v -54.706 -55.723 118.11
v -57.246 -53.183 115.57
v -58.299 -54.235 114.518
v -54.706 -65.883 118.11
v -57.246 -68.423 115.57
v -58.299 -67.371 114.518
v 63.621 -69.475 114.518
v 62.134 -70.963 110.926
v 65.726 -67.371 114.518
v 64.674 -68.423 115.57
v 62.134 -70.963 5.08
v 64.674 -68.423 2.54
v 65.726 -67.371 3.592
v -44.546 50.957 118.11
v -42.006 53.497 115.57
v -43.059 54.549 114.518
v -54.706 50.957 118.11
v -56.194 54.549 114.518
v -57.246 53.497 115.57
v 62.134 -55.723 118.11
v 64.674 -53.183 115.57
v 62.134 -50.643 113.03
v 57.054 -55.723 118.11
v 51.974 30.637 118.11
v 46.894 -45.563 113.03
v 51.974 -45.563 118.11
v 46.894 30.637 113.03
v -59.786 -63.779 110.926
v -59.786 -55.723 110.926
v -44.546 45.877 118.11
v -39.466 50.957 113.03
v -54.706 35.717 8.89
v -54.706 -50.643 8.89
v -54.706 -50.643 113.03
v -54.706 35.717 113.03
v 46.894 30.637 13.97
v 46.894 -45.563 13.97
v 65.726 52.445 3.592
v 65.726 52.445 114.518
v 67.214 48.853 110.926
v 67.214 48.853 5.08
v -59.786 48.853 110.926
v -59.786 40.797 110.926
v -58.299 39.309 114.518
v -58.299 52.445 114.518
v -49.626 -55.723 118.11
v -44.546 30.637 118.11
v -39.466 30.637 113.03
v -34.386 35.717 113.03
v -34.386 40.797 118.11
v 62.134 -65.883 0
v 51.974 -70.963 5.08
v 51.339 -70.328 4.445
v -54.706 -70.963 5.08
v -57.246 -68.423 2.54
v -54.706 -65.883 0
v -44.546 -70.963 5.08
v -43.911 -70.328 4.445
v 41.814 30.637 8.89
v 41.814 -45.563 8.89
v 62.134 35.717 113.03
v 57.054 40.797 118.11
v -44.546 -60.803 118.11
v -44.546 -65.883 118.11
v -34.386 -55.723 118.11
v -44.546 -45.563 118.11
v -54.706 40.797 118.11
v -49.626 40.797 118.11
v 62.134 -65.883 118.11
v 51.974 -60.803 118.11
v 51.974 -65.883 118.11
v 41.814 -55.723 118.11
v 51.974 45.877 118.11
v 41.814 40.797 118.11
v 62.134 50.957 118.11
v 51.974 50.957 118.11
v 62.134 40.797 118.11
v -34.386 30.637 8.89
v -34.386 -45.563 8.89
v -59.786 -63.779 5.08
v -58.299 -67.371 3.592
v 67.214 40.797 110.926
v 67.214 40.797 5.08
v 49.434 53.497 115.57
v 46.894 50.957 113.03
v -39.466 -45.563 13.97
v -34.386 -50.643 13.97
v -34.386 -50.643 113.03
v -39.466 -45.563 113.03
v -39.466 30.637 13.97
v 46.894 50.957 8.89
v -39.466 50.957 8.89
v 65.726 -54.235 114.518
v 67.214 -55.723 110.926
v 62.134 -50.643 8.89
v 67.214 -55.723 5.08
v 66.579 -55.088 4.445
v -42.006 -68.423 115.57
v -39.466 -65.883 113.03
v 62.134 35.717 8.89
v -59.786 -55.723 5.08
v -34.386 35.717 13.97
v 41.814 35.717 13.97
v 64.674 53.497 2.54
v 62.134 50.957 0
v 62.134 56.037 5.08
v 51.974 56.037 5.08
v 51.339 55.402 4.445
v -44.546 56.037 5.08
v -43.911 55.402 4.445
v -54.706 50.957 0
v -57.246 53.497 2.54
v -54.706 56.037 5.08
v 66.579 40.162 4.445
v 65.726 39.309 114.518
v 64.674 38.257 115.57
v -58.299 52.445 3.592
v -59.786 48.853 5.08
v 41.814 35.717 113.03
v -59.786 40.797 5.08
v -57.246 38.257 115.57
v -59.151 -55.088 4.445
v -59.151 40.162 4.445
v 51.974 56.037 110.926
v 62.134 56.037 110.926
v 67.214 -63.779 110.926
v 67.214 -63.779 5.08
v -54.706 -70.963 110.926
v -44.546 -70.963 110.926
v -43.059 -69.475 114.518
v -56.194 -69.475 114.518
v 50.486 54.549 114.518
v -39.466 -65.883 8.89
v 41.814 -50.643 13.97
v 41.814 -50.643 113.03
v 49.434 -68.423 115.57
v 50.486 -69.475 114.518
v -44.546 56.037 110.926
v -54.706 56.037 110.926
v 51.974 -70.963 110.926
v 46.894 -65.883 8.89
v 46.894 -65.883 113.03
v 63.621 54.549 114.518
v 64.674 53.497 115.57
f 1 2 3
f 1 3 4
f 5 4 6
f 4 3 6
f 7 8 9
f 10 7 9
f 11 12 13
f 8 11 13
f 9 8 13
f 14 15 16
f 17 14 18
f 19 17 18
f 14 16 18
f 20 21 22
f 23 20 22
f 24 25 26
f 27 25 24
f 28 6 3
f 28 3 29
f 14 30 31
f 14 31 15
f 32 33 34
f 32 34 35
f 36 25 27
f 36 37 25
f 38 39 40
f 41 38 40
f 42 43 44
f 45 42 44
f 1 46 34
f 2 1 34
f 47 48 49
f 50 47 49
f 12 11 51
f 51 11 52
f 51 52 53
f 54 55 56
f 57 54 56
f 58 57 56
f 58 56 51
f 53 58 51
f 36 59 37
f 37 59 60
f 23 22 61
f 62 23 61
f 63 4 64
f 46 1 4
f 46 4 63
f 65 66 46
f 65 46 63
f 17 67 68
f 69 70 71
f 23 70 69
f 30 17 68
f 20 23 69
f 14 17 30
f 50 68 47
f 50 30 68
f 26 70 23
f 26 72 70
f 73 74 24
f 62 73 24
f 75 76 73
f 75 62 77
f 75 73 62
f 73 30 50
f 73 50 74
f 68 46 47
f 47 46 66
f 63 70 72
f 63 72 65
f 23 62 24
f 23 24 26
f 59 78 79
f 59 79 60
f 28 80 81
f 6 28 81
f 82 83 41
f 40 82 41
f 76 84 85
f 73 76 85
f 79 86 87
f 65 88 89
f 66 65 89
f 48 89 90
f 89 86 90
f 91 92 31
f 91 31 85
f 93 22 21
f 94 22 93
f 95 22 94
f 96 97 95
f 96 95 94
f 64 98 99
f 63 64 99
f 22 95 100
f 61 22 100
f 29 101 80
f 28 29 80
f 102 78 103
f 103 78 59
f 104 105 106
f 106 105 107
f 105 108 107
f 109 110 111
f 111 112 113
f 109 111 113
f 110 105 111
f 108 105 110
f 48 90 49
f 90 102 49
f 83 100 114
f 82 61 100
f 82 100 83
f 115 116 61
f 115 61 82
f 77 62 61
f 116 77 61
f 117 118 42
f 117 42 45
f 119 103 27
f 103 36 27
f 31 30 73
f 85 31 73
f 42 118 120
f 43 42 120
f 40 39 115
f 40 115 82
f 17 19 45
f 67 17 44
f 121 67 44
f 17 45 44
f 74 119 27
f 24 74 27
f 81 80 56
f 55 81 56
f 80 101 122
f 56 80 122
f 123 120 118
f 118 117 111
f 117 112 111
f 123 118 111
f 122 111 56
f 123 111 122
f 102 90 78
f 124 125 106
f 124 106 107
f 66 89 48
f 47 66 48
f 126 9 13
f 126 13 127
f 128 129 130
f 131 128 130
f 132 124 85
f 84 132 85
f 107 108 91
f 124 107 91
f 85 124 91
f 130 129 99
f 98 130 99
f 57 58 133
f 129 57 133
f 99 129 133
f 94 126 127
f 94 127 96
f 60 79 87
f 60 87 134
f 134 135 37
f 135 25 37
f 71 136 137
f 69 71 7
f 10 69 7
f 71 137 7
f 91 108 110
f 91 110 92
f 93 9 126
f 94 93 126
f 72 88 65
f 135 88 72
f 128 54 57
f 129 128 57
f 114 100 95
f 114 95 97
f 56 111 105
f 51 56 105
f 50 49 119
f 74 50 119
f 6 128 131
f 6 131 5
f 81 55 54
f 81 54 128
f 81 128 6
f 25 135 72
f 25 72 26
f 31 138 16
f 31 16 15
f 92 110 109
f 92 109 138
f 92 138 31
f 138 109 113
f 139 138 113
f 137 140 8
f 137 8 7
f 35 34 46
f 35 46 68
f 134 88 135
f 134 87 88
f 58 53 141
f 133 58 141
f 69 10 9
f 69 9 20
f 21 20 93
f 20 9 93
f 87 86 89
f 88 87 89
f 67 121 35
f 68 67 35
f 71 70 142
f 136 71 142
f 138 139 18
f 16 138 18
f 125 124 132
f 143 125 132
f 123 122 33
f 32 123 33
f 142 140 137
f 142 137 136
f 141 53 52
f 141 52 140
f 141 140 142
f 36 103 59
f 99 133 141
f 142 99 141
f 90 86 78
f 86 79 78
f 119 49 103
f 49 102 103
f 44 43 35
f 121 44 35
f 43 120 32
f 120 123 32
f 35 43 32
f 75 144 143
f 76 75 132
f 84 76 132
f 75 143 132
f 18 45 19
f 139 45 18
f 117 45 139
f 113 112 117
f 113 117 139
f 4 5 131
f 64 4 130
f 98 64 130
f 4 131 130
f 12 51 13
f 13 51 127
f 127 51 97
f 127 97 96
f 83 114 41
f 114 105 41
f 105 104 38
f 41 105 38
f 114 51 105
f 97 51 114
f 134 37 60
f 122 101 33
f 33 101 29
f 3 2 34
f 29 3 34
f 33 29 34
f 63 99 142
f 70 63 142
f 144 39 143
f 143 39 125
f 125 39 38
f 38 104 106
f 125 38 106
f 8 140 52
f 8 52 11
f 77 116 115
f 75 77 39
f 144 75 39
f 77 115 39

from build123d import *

# Parameters (mm, degrees)
F0_W          = 127
F0_H          = 127
F1_DEPTH      = 8.89
F2_W          = 86.36
F2_H          = 10.16
F2_W_2        = 10.16
F2_H_2        = 86.36
F3_DEPTH      = 101.6
F4_W          = 10.0171214116
F4_H          = 10.0171214116
F4_W_2        = 96.3771214116
F4_H_2        = 96.3771214116
F4_W_3        = 86.36
F4_H_3        = 86.36
F5_DEPTH      = 7.62
F6_W          = 86.36
F6_H          = 5.08
F9_W          = 5.08
F9_H          = 86.36
F7_W          = 5.08
F7_H          = 86.36
F8_W          = 86.36
F8_H          = 5.08
F10_DEPTH     = 109.22
F11_SIZE      = 5.08
F12_T1_DEPTH  = 139.1582991577
F12_T3_DEPTH  = 31.7862799398
F12_T5_DEPTH  = 153.1282991577
F12_T7_DEPTH  = 117.2041495789
F12_T9_DEPTH  = 86.36
F12_T11_DEPTH = 31.7862799398
F12_T17_DEPTH = 130.2682991577
F12_T22_DEPTH = 99.4241495789
F12_T29_DEPTH = 99.4241495789
F12_T33_DEPTH = 130.2682991577
F12_T41_DEPTH = 130.2682991577
F12_T46_DEPTH = 99.4241495789
F12_T53_DEPTH = 99.4241495789
F12_T57_DEPTH = 130.2682991577
F13_T1_DEPTH  = 124.4962799399
F13_T3_DEPTH  = 142.9682991577
F13_T5_DEPTH  = 26.7062799397
F13_T7_DEPTH  = 117.2041495789
F13_T9_DEPTH  = 86.36
F13_T11_DEPTH = 26.7062799398
F13_T17_DEPTH = 130.2682991577
F13_T22_DEPTH = 99.4241495789
F13_T29_DEPTH = 99.4241495789
F13_T33_DEPTH = 130.2682991577
F13_T41_DEPTH = 130.2682991577
F13_T46_DEPTH = 99.4241495789
F13_T53_DEPTH = 99.4241495789
F13_T57_DEPTH = 130.2682991577


# Not quite as in the source:
# - a fillet or chamfer that OpenCascade refuses, or shapes differently, is made with other operations: its cross-section is extruded or revolved along the edge and cut away or added


with BuildPart() as f1:
    # F0 (on Top) → F1 (new body)
    with BuildSketch(Plane.XY):
        with Locations((3.7135761231, -7.4630701935)):
            Rectangle(F0_W, F0_H)
    extrude(amount=F1_DEPTH)

    # F2 (on face) → F3 (join)
    with BuildSketch(Plane.XY.offset(8.89)):
        Polygon((-59.7864238769, 56.0369298065), (-59.7864238769, 35.7169298065), (-49.6264238769, 35.7169298065), (-39.4664238769, 35.7169298065), (-39.4664238769, 45.8769298065), (-39.4664238769, 56.0369298065), align=None)
        with Locations((3.7135761231, 40.7969298065)):
            Rectangle(F2_W, F2_H)
        Polygon((46.8935761231, 45.8769298065), (46.8935761231, 35.7169298065), (57.0535761231, 35.7169298065), (67.2135761231, 35.7169298065), (67.2135761231, 56.0369298065), (46.8935761231, 56.0369298065), align=None)
        with Locations((51.9735761231, -7.4630701935)):
            Rectangle(F2_W_2, F2_H_2)
        with Locations((-44.5464238769, -7.4630701935)):
            Rectangle(F2_W_2, F2_H_2)
        Polygon((-59.7864238769, -50.6430701935), (-59.7864238769, -70.9630701935), (-39.4664238769, -70.9630701935), (-39.4664238769, -60.8030701935), (-39.4664238769, -50.6430701935), (-49.6264238769, -50.6430701935), align=None)
        Polygon((46.8935761231, -60.8030701935), (46.8935761231, -70.9630701935), (67.2135761231, -70.9630701935), (67.2135761231, -50.6430701935), (57.0535761231, -50.6430701935), (46.8935761231, -50.6430701935), align=None)
        with Locations((3.7135761231, -55.7230701935)):
            Rectangle(F2_W, F2_H)
    extrude(amount=F3_DEPTH)

    # F4 (on face) → F5 (join)
    with BuildSketch(Plane.XY.offset(110.49)):
        Polygon((-39.4664238769, 56.0369298065), (-59.7864238769, 56.0369298065), (-59.7864238769, 35.7169298065), (-49.6264238769, 35.7169298065), (-49.6264238769, -50.6430701935), (-59.7864238769, -50.6430701935), (-59.7864238769, -70.9630701935), (-39.4664238769, -70.9630701935), (-39.4664238769, -60.8030701935), (46.8935761231, -60.8030701935), (46.8935761231, -70.9630701935), (67.2135761231, -70.9630701935), (67.2135761231, -50.6430701935), (57.0535761231, -50.6430701935), (57.0535761231, 35.7169298065), (67.2135761231, 35.7169298065), (67.2135761231, 56.0369298065), (46.8935761231, 56.0369298065), (46.8935761231, 45.8769298065), (-39.4664238769, 45.8769298065), align=None)
        with Locations((-49.6264238769, -60.8030701935)):
            Rectangle(F4_W, F4_H, mode=Mode.SUBTRACT)
        with Locations((57.0535761231, -60.8030701935)):
            Rectangle(F4_W, F4_H, mode=Mode.SUBTRACT)
        with Locations((-49.6264238769, 45.8769298065)):
            Rectangle(F4_W, F4_H, mode=Mode.SUBTRACT)
        with Locations((3.7135761231, -7.4630701935)):
            Rectangle(F4_W_2, F4_H_2, mode=Mode.SUBTRACT)
        with Locations((57.0535761231, 45.8769298065)):
            Rectangle(F4_W, F4_H, mode=Mode.SUBTRACT)
        with Locations((3.7135761231, -7.4630701935)):
            Rectangle(F4_W_2, F4_H_2)
        with Locations((3.7135761231, -7.4630701935)):
            Rectangle(F4_W_3, F4_H_3, mode=Mode.SUBTRACT)
        with Locations((-49.6264238769, 45.8769298065)):
            Rectangle(F4_W, F4_H)
        with Locations((57.0535761231, 45.8769298065)):
            Rectangle(F4_W, F4_H)
        with Locations((-49.6264238769, -60.8030701935)):
            Rectangle(F4_W, F4_H)
        with Locations((57.0535761231, -60.8030701935)):
            Rectangle(F4_W, F4_H)
    extrude(amount=F5_DEPTH)

    # F6 (on face) + F9 (on face) + F7 (on face) + F8 (on face) → F10 (join)
    with BuildSketch(Plane.XY.offset(8.89)):
        with Locations((3.7135761231, 48.4169298065)):
            Rectangle(F6_W, F6_H)
    with BuildSketch(Plane.XY.offset(8.89)):
        with Locations((-52.1664238769, -7.4630701935)):
            Rectangle(F9_W, F9_H)
    with BuildSketch(Plane.XY.offset(8.89)):
        with Locations((59.5935761231, -7.4630701935)):
            Rectangle(F7_W, F7_H)
    with BuildSketch(Plane.XY.offset(8.89)):
        with Locations((3.7135761231, -63.3430701935)):
            Rectangle(F8_W, F8_H)
    extrude(amount=F10_DEPTH)

    # F11
    f11_edges = [f1.edges().sort_by_distance(p)[0] for p in [
        (3.713576, -50.64307, 118.11),
        (-39.466424, -7.46307, 118.11),
        (3.713576, 35.71693, 118.11),
        (46.893576, -7.46307, 118.11),
        (67.213576, 45.87693, 118.11),
        (57.053576, 56.03693, 118.11),
        (46.893576, 53.49693, 118.11),
        (3.713576, 50.95693, 118.11),
        (-39.466424, 53.49693, 118.11),
        (-49.626424, 56.03693, 118.11),
        (-59.786424, 45.87693, 118.11),
        (-57.246424, 35.71693, 118.11),
        (-54.706424, -7.46307, 118.11),
        (-57.246424, -50.64307, 118.11),
        (-59.786424, -60.80307, 118.11),
        (-49.626424, -70.96307, 118.11),
        (-39.466424, -68.42307, 118.11),
        (3.713576, -65.88307, 118.11),
        (46.893576, -68.42307, 118.11),
        (57.053576, -70.96307, 118.11),
        (67.213576, -60.80307, 118.11),
        (64.673576, -50.64307, 118.11),
        (62.133576, -7.46307, 118.11),
        (64.673576, 35.71693, 118.11),
        (-39.466424, 35.71693, 63.5),
        (-39.466424, -7.46307, 8.89),
        (-39.466424, -50.64307, 63.5),
        (46.893576, 35.71693, 63.5),
        (3.713576, 35.71693, 8.89),
        (46.893576, -50.64307, 63.5),
        (46.893576, -7.46307, 8.89),
        (3.713576, -50.64307, 8.89),
    ]]
    chamfer(f11_edges, length=F11_SIZE)

    # F12: chamfer of 5.08 on 16 edges, made by hand

    # F12_s2 → F12_t1 (cut)
    with BuildSketch(Plane.XY.offset(-13.0641495789)):
        Polygon((67.2135761231, 50.9569298065), (62.1335761231, 56.0369298065), (67.2135761231, 56.0369298065), align=None)
        Polygon((-59.7864238769, 50.9569298065), (-54.7064238769, 56.0369298065), (-59.7864238769, 56.0369298065), align=None)
        Polygon((-54.7064238769, -70.9630701935), (-59.7864238769, -65.8830701935), (-59.7864238769, -70.9630701935), align=None)
        Polygon((62.1335761231, -70.9630701935), (67.2135761231, -65.8830701935), (67.2135761231, -70.9630701935), align=None)
    extrude(amount=F12_T1_DEPTH, mode=Mode.SUBTRACT)

    # F12_s4 → F12_t3 (cut)
    with BuildSketch(Plane.YZ.offset(41.1604361532)):
        Polygon((56.0369298065, 110.9257951031), (54.5490322549, 114.5178975516), (56.0369298065, 113.03), align=None)
        Polygon((-70.9630701935, 110.9257951031), (-69.4751726419, 114.5178975516), (-70.9630701935, 113.03), align=None)
    extrude(amount=F12_T3_DEPTH, mode=Mode.SUBTRACT)

    # F12_s6 → F12_t5 (cut)
    with BuildSketch(Plane.YZ.offset(-72.8505734557)):
        Polygon((50.9569298065, 0), (56.0369298065, 5.08), (56.0369298065, 0), align=None)
        Polygon((-70.9630701935, 5.08), (-65.8830701935, 0), (-70.9630701935, 0), align=None)
    extrude(amount=F12_T5_DEPTH, mode=Mode.SUBTRACT)

    # F12_s8 → F12_t7 (cut)
    with BuildSketch(Plane.XY.offset(8.89)):
        Polygon((51.9735761231, 56.0369298065), (46.8935761231, 50.9569298065), (46.8935761231, 56.0369298065), align=None)
        Polygon((-44.5464238769, 56.0369298065), (-39.4664238769, 50.9569298065), (-39.4664238769, 56.0369298065), align=None)
        Polygon((-44.5464238769, -70.9630701935), (-39.4664238769, -65.8830701935), (-39.4664238769, -70.9630701935), align=None)
        Polygon((51.9735761231, -70.9630701935), (46.8935761231, -65.8830701935), (46.8935761231, -70.9630701935), align=None)
    extrude(amount=F12_T7_DEPTH, mode=Mode.SUBTRACT)

    # F12_s10 → F12_t9 (cut)
    with BuildSketch(Plane.YZ.offset(-39.4664238769)):
        Polygon((56.0369298065, 3.81), (50.9569298065, 8.89), (56.0369298065, 8.89), align=None)
        Polygon((-70.9630701935, 3.81), (-65.8830701935, 8.89), (-70.9630701935, 8.89), align=None)
    extrude(amount=F12_T9_DEPTH, mode=Mode.SUBTRACT)

    # F12_s12 → F12_t11 (cut)
    with BuildSketch(Plane.YZ.offset(-65.5195638468)):
        Polygon((56.0369298065, 110.9257951031), (54.5490322549, 114.5178975516), (56.0369298065, 113.03), align=None)
        Polygon((-70.9630701935, 110.9257951031), (-69.4751726419, 114.5178975516), (-70.9630701935, 113.03), align=None)
    extrude(amount=F12_T11_DEPTH, mode=Mode.SUBTRACT)


with BuildPart() as f12_tool15:
    # F12_s16 → F12_t17 (new body)
    with BuildSketch(Plane.XY.offset(-4.1741495789)):
        Polygon((51.9735761231, 56.0369298065), (46.8935761231, 50.9569298065), (46.8935761231, 56.0369298065), align=None)
    extrude(amount=F12_T17_DEPTH)

    split(bisect_by=Plane.XY, keep=Keep.TOP)

    split(bisect_by=Plane.XY.offset(8.89), keep=Keep.BOTTOM)


with BuildPart() as f12_tool20:
    # F12_s21 → F12_t22 (new body)
    with BuildSketch(Plane.YZ.offset(59.957725702)):
        Polygon((56.0369298065, 3.81), (50.9569298065, 8.89), (56.0369298065, 8.89), align=None)
    extrude(amount=-F12_T22_DEPTH)

    split(bisect_by=Plane.YZ.offset(46.8935761231), keep=Keep.TOP)


with BuildPart() as f12_tool15_1:
    add(f12_tool15.part)

    # F12_t24: intersect F12_tool20
    add(f12_tool20.part, mode=Mode.INTERSECT)


with BuildPart() as f1_1:
    add(f1.part)

    # F12_t13: cut F12_tool15
    add(f12_tool15_1.part, mode=Mode.SUBTRACT)


with BuildPart() as f12_tool27:
    # F12_s28 → F12_t29 (new body)
    with BuildSketch(Plane.YZ.offset(46.8935761231)):
        Polygon((56.0369298065, 3.81), (50.9569298065, 8.89), (56.0369298065, 8.89), align=None)
    extrude(amount=-F12_T29_DEPTH)

    split(bisect_by=Plane.YZ.offset(-39.4664238769), keep=Keep.BOTTOM)


with BuildPart() as f12_tool31:
    # F12_s32 → F12_t33 (new body)
    with BuildSketch(Plane.XY.offset(126.0941495789)):
        Polygon((-44.5464238769, 56.0369298065), (-39.4664238769, 50.9569298065), (-39.4664238769, 56.0369298065), align=None)
    extrude(amount=-F12_T33_DEPTH)

    split(bisect_by=Plane.XY, keep=Keep.TOP)

    split(bisect_by=Plane.XY.offset(8.89), keep=Keep.BOTTOM)


with BuildPart() as f12_tool27_1:
    add(f12_tool27.part)

    # F12_t36: intersect F12_tool31
    add(f12_tool31.part, mode=Mode.INTERSECT)


with BuildPart() as f1_2:
    add(f1_1.part)

    # F12_t25: cut F12_tool27
    add(f12_tool27_1.part, mode=Mode.SUBTRACT)


with BuildPart() as f12_tool39:
    # F12_s40 → F12_t41 (new body)
    with BuildSketch(Plane.XY.offset(-4.1741495789)):
        Polygon((-44.5464238769, -70.9630701935), (-39.4664238769, -65.8830701935), (-39.4664238769, -70.9630701935), align=None)
    extrude(amount=F12_T41_DEPTH)

    split(bisect_by=Plane.XY, keep=Keep.TOP)

    split(bisect_by=Plane.XY.offset(8.89), keep=Keep.BOTTOM)


with BuildPart() as f12_tool44:
    # F12_s45 → F12_t46 (new body)
    with BuildSketch(Plane.YZ.offset(-52.5305734557)):
        Polygon((-70.9630701935, 3.81), (-65.8830701935, 8.89), (-70.9630701935, 8.89), align=None)
    extrude(amount=F12_T46_DEPTH)

    split(bisect_by=Plane.YZ.offset(-39.4664238769), keep=Keep.BOTTOM)


with BuildPart() as f12_tool39_1:
    add(f12_tool39.part)

    # F12_t48: intersect F12_tool44
    add(f12_tool44.part, mode=Mode.INTERSECT)


with BuildPart() as f1_3:
    add(f1_2.part)

    # F12_t37: cut F12_tool39
    add(f12_tool39_1.part, mode=Mode.SUBTRACT)


with BuildPart() as f12_tool51:
    # F12_s52 → F12_t53 (new body)
    with BuildSketch(Plane.YZ.offset(-39.4664238769)):
        Polygon((-70.9630701935, 3.81), (-65.8830701935, 8.89), (-70.9630701935, 8.89), align=None)
    extrude(amount=F12_T53_DEPTH)

    split(bisect_by=Plane.YZ.offset(46.8935761231), keep=Keep.TOP)


with BuildPart() as f12_tool55:
    # F12_s56 → F12_t57 (new body)
    with BuildSketch(Plane.XY.offset(126.0941495789)):
        Polygon((51.9735761231, -70.9630701935), (46.8935761231, -65.8830701935), (46.8935761231, -70.9630701935), align=None)
    extrude(amount=-F12_T57_DEPTH)

    split(bisect_by=Plane.XY, keep=Keep.TOP)

    split(bisect_by=Plane.XY.offset(8.89), keep=Keep.BOTTOM)


with BuildPart() as f12_tool51_1:
    add(f12_tool51.part)

    # F12_t60: intersect F12_tool55
    add(f12_tool55.part, mode=Mode.INTERSECT)


with BuildPart() as f1_4:
    add(f1_3.part)

    # F12_t49: cut F12_tool51
    add(f12_tool51_1.part, mode=Mode.SUBTRACT)

    # F13: chamfer of 5.08 on 16 edges, made by hand

    # F13_s2 → F13_t1 (cut)
    with BuildSketch(Plane.XY.offset(-5.7331399699)):
        Polygon((-59.7864238769, 48.8527249097), (-58.2985263253, 52.4448273581), (-59.7864238769, 50.9569298065), align=None)
        Polygon((-59.7864238769, -63.7788652967), (-58.2985263253, -67.3709677451), (-59.7864238769, -65.8830701935), align=None)
        Polygon((65.7256785715, -67.3709677451), (67.2135761231, -63.7788652966), (67.2135761231, -65.8830701935), align=None)
        Polygon((65.7256785715, 52.4448273581), (67.2135761231, 48.8527249096), (67.2135761231, 50.9569298065), align=None)
    extrude(amount=F13_T1_DEPTH, mode=Mode.SUBTRACT)

    # F13_s4 → F13_t3 (cut)
    with BuildSketch(Plane.XZ.offset(-64.0210793854)):
        Polygon((-59.7864238769, 5.08), (-54.7064238769, 0), (-59.7864238769, 0), align=None)
        Polygon((62.1335761231, 0), (67.2135761231, 5.08), (67.2135761231, 0), align=None)
    extrude(amount=F13_T3_DEPTH, mode=Mode.SUBTRACT)

    # F13_s6 → F13_t5 (cut)
    with BuildSketch(Plane.XZ.offset(44.9099302236)):
        Polygon((-58.2985263253, 114.5178975516), (-59.7864238769, 110.9257951031), (-59.7864238769, 113.03), align=None)
        Polygon((65.7256785715, 114.5178975516), (67.2135761231, 110.9257951031), (67.2135761231, 113.03), align=None)
    extrude(amount=F13_T5_DEPTH, mode=Mode.SUBTRACT)

    # F13_s8 → F13_t7 (cut)
    with BuildSketch(Plane.XY.offset(8.89)):
        Polygon((-59.7864238769, -55.7230701935), (-54.7064238769, -50.6430701935), (-59.7864238769, -50.6430701935), align=None)
        Polygon((-59.7864238769, 40.7969298065), (-54.7064238769, 35.7169298065), (-59.7864238769, 35.7169298065), align=None)
        Polygon((62.1335761231, 35.7169298065), (67.2135761231, 40.7969298065), (67.2135761231, 35.7169298065), align=None)
        Polygon((62.1335761231, -50.6430701935), (67.2135761231, -55.7230701935), (67.2135761231, -50.6430701935), align=None)
    extrude(amount=F13_T7_DEPTH, mode=Mode.SUBTRACT)

    # F13_s10 → F13_t9 (cut)
    with BuildSketch(Plane.XZ.offset(-35.7169298065)):
        Polygon((-59.7864238769, 3.81), (-54.7064238769, 8.89), (-59.7864238769, 8.89), align=None)
        Polygon((62.1335761231, 8.89), (67.2135761231, 3.81), (67.2135761231, 8.89), align=None)
    extrude(amount=F13_T9_DEPTH, mode=Mode.SUBTRACT)

    # F13_s12 → F13_t11 (cut)
    with BuildSketch(Plane.XZ.offset(-56.6900697764)):
        Polygon((-59.7864238769, 110.9257951031), (-58.2985263253, 114.5178975516), (-59.7864238769, 113.03), align=None)
        Polygon((65.7256785715, 114.5178975516), (67.2135761231, 110.9257951031), (67.2135761231, 113.03), align=None)
    extrude(amount=F13_T11_DEPTH, mode=Mode.SUBTRACT)


with BuildPart() as f13_tool15:
    # F13_s16 → F13_t17 (new body)
    with BuildSketch(Plane.XY.offset(126.0941495789)):
        Polygon((-59.7864238769, -55.7230701935), (-54.7064238769, -50.6430701935), (-59.7864238769, -50.6430701935), align=None)
    extrude(amount=-F13_T17_DEPTH)

    split(bisect_by=Plane.XY.offset(8.89), keep=Keep.BOTTOM)

    split(bisect_by=Plane.XY, keep=Keep.TOP)


with BuildPart() as f13_tool20:
    # F13_s21 → F13_t22 (new body)
    with BuildSketch(Plane.XZ.offset(-35.7169298065)):
        Polygon((-59.7864238769, 3.81), (-54.7064238769, 8.89), (-59.7864238769, 8.89), align=None)
    extrude(amount=F13_T22_DEPTH)

    split(bisect_by=Plane.XZ.offset(50.6430701935), keep=Keep.TOP)


with BuildPart() as f13_tool15_1:
    add(f13_tool15.part)

    # F13_t24: intersect F13_tool20
    add(f13_tool20.part, mode=Mode.INTERSECT)


with BuildPart() as f1_5:
    add(f1_4.part)

    # F13_t13: cut F13_tool15
    add(f13_tool15_1.part, mode=Mode.SUBTRACT)


with BuildPart() as f13_tool27:
    # F13_s28 → F13_t29 (new body)
    with BuildSketch(Plane.XZ.offset(-48.7810793854)):
        Polygon((-59.7864238769, 3.81), (-54.7064238769, 8.89), (-59.7864238769, 8.89), align=None)
    extrude(amount=F13_T29_DEPTH)

    split(bisect_by=Plane.XZ.offset(-35.7169298065), keep=Keep.BOTTOM)


with BuildPart() as f13_tool31:
    # F13_s32 → F13_t33 (new body)
    with BuildSketch(Plane.XY.offset(-4.1741495789)):
        Polygon((-59.7864238769, 40.7969298065), (-54.7064238769, 35.7169298065), (-59.7864238769, 35.7169298065), align=None)
    extrude(amount=F13_T33_DEPTH)

    split(bisect_by=Plane.XY.offset(8.89), keep=Keep.BOTTOM)

    split(bisect_by=Plane.XY, keep=Keep.TOP)


with BuildPart() as f13_tool27_1:
    add(f13_tool27.part)

    # F13_t36: intersect F13_tool31
    add(f13_tool31.part, mode=Mode.INTERSECT)


with BuildPart() as f1_6:
    add(f1_5.part)

    # F13_t25: cut F13_tool27
    add(f13_tool27_1.part, mode=Mode.SUBTRACT)


with BuildPart() as f13_tool39:
    # F13_s40 → F13_t41 (new body)
    with BuildSketch(Plane.XY.offset(126.0941495789)):
        Polygon((62.1335761231, 35.7169298065), (67.2135761231, 40.7969298065), (67.2135761231, 35.7169298065), align=None)
    extrude(amount=-F13_T41_DEPTH)

    split(bisect_by=Plane.XY, keep=Keep.TOP)

    split(bisect_by=Plane.XY.offset(8.89), keep=Keep.BOTTOM)


with BuildPart() as f13_tool44:
    # F13_s45 → F13_t46 (new body)
    with BuildSketch(Plane.XZ.offset(50.6430701935)):
        Polygon((62.1335761231, 8.89), (67.2135761231, 3.81), (67.2135761231, 8.89), align=None)
    extrude(amount=-F13_T46_DEPTH)

    split(bisect_by=Plane.XZ.offset(-35.7169298065), keep=Keep.BOTTOM)


with BuildPart() as f13_tool39_1:
    add(f13_tool39.part)

    # F13_t48: intersect F13_tool44
    add(f13_tool44.part, mode=Mode.INTERSECT)


with BuildPart() as f1_7:
    add(f1_6.part)

    # F13_t37: cut F13_tool39
    add(f13_tool39_1.part, mode=Mode.SUBTRACT)


with BuildPart() as f13_tool51:
    # F13_s52 → F13_t53 (new body)
    with BuildSketch(Plane.XZ.offset(63.7072197724)):
        Polygon((62.1335761231, 8.89), (67.2135761231, 3.81), (67.2135761231, 8.89), align=None)
    extrude(amount=-F13_T53_DEPTH)

    split(bisect_by=Plane.XZ.offset(50.6430701935), keep=Keep.TOP)


with BuildPart() as f13_tool55:
    # F13_s56 → F13_t57 (new body)
    with BuildSketch(Plane.XY.offset(-4.1741495789)):
        Polygon((62.1335761231, -50.6430701935), (67.2135761231, -55.7230701935), (67.2135761231, -50.6430701935), align=None)
    extrude(amount=F13_T57_DEPTH)

    split(bisect_by=Plane.XY, keep=Keep.TOP)

    split(bisect_by=Plane.XY.offset(8.89), keep=Keep.BOTTOM)


with BuildPart() as f13_tool51_1:
    add(f13_tool51.part)

    # F13_t60: intersect F13_tool55
    add(f13_tool55.part, mode=Mode.INTERSECT)


with BuildPart() as f1_8:
    add(f1_7.part)

    # F13_t49: cut F13_tool51
    add(f13_tool51_1.part, mode=Mode.SUBTRACT)


solid = f1_8.part
